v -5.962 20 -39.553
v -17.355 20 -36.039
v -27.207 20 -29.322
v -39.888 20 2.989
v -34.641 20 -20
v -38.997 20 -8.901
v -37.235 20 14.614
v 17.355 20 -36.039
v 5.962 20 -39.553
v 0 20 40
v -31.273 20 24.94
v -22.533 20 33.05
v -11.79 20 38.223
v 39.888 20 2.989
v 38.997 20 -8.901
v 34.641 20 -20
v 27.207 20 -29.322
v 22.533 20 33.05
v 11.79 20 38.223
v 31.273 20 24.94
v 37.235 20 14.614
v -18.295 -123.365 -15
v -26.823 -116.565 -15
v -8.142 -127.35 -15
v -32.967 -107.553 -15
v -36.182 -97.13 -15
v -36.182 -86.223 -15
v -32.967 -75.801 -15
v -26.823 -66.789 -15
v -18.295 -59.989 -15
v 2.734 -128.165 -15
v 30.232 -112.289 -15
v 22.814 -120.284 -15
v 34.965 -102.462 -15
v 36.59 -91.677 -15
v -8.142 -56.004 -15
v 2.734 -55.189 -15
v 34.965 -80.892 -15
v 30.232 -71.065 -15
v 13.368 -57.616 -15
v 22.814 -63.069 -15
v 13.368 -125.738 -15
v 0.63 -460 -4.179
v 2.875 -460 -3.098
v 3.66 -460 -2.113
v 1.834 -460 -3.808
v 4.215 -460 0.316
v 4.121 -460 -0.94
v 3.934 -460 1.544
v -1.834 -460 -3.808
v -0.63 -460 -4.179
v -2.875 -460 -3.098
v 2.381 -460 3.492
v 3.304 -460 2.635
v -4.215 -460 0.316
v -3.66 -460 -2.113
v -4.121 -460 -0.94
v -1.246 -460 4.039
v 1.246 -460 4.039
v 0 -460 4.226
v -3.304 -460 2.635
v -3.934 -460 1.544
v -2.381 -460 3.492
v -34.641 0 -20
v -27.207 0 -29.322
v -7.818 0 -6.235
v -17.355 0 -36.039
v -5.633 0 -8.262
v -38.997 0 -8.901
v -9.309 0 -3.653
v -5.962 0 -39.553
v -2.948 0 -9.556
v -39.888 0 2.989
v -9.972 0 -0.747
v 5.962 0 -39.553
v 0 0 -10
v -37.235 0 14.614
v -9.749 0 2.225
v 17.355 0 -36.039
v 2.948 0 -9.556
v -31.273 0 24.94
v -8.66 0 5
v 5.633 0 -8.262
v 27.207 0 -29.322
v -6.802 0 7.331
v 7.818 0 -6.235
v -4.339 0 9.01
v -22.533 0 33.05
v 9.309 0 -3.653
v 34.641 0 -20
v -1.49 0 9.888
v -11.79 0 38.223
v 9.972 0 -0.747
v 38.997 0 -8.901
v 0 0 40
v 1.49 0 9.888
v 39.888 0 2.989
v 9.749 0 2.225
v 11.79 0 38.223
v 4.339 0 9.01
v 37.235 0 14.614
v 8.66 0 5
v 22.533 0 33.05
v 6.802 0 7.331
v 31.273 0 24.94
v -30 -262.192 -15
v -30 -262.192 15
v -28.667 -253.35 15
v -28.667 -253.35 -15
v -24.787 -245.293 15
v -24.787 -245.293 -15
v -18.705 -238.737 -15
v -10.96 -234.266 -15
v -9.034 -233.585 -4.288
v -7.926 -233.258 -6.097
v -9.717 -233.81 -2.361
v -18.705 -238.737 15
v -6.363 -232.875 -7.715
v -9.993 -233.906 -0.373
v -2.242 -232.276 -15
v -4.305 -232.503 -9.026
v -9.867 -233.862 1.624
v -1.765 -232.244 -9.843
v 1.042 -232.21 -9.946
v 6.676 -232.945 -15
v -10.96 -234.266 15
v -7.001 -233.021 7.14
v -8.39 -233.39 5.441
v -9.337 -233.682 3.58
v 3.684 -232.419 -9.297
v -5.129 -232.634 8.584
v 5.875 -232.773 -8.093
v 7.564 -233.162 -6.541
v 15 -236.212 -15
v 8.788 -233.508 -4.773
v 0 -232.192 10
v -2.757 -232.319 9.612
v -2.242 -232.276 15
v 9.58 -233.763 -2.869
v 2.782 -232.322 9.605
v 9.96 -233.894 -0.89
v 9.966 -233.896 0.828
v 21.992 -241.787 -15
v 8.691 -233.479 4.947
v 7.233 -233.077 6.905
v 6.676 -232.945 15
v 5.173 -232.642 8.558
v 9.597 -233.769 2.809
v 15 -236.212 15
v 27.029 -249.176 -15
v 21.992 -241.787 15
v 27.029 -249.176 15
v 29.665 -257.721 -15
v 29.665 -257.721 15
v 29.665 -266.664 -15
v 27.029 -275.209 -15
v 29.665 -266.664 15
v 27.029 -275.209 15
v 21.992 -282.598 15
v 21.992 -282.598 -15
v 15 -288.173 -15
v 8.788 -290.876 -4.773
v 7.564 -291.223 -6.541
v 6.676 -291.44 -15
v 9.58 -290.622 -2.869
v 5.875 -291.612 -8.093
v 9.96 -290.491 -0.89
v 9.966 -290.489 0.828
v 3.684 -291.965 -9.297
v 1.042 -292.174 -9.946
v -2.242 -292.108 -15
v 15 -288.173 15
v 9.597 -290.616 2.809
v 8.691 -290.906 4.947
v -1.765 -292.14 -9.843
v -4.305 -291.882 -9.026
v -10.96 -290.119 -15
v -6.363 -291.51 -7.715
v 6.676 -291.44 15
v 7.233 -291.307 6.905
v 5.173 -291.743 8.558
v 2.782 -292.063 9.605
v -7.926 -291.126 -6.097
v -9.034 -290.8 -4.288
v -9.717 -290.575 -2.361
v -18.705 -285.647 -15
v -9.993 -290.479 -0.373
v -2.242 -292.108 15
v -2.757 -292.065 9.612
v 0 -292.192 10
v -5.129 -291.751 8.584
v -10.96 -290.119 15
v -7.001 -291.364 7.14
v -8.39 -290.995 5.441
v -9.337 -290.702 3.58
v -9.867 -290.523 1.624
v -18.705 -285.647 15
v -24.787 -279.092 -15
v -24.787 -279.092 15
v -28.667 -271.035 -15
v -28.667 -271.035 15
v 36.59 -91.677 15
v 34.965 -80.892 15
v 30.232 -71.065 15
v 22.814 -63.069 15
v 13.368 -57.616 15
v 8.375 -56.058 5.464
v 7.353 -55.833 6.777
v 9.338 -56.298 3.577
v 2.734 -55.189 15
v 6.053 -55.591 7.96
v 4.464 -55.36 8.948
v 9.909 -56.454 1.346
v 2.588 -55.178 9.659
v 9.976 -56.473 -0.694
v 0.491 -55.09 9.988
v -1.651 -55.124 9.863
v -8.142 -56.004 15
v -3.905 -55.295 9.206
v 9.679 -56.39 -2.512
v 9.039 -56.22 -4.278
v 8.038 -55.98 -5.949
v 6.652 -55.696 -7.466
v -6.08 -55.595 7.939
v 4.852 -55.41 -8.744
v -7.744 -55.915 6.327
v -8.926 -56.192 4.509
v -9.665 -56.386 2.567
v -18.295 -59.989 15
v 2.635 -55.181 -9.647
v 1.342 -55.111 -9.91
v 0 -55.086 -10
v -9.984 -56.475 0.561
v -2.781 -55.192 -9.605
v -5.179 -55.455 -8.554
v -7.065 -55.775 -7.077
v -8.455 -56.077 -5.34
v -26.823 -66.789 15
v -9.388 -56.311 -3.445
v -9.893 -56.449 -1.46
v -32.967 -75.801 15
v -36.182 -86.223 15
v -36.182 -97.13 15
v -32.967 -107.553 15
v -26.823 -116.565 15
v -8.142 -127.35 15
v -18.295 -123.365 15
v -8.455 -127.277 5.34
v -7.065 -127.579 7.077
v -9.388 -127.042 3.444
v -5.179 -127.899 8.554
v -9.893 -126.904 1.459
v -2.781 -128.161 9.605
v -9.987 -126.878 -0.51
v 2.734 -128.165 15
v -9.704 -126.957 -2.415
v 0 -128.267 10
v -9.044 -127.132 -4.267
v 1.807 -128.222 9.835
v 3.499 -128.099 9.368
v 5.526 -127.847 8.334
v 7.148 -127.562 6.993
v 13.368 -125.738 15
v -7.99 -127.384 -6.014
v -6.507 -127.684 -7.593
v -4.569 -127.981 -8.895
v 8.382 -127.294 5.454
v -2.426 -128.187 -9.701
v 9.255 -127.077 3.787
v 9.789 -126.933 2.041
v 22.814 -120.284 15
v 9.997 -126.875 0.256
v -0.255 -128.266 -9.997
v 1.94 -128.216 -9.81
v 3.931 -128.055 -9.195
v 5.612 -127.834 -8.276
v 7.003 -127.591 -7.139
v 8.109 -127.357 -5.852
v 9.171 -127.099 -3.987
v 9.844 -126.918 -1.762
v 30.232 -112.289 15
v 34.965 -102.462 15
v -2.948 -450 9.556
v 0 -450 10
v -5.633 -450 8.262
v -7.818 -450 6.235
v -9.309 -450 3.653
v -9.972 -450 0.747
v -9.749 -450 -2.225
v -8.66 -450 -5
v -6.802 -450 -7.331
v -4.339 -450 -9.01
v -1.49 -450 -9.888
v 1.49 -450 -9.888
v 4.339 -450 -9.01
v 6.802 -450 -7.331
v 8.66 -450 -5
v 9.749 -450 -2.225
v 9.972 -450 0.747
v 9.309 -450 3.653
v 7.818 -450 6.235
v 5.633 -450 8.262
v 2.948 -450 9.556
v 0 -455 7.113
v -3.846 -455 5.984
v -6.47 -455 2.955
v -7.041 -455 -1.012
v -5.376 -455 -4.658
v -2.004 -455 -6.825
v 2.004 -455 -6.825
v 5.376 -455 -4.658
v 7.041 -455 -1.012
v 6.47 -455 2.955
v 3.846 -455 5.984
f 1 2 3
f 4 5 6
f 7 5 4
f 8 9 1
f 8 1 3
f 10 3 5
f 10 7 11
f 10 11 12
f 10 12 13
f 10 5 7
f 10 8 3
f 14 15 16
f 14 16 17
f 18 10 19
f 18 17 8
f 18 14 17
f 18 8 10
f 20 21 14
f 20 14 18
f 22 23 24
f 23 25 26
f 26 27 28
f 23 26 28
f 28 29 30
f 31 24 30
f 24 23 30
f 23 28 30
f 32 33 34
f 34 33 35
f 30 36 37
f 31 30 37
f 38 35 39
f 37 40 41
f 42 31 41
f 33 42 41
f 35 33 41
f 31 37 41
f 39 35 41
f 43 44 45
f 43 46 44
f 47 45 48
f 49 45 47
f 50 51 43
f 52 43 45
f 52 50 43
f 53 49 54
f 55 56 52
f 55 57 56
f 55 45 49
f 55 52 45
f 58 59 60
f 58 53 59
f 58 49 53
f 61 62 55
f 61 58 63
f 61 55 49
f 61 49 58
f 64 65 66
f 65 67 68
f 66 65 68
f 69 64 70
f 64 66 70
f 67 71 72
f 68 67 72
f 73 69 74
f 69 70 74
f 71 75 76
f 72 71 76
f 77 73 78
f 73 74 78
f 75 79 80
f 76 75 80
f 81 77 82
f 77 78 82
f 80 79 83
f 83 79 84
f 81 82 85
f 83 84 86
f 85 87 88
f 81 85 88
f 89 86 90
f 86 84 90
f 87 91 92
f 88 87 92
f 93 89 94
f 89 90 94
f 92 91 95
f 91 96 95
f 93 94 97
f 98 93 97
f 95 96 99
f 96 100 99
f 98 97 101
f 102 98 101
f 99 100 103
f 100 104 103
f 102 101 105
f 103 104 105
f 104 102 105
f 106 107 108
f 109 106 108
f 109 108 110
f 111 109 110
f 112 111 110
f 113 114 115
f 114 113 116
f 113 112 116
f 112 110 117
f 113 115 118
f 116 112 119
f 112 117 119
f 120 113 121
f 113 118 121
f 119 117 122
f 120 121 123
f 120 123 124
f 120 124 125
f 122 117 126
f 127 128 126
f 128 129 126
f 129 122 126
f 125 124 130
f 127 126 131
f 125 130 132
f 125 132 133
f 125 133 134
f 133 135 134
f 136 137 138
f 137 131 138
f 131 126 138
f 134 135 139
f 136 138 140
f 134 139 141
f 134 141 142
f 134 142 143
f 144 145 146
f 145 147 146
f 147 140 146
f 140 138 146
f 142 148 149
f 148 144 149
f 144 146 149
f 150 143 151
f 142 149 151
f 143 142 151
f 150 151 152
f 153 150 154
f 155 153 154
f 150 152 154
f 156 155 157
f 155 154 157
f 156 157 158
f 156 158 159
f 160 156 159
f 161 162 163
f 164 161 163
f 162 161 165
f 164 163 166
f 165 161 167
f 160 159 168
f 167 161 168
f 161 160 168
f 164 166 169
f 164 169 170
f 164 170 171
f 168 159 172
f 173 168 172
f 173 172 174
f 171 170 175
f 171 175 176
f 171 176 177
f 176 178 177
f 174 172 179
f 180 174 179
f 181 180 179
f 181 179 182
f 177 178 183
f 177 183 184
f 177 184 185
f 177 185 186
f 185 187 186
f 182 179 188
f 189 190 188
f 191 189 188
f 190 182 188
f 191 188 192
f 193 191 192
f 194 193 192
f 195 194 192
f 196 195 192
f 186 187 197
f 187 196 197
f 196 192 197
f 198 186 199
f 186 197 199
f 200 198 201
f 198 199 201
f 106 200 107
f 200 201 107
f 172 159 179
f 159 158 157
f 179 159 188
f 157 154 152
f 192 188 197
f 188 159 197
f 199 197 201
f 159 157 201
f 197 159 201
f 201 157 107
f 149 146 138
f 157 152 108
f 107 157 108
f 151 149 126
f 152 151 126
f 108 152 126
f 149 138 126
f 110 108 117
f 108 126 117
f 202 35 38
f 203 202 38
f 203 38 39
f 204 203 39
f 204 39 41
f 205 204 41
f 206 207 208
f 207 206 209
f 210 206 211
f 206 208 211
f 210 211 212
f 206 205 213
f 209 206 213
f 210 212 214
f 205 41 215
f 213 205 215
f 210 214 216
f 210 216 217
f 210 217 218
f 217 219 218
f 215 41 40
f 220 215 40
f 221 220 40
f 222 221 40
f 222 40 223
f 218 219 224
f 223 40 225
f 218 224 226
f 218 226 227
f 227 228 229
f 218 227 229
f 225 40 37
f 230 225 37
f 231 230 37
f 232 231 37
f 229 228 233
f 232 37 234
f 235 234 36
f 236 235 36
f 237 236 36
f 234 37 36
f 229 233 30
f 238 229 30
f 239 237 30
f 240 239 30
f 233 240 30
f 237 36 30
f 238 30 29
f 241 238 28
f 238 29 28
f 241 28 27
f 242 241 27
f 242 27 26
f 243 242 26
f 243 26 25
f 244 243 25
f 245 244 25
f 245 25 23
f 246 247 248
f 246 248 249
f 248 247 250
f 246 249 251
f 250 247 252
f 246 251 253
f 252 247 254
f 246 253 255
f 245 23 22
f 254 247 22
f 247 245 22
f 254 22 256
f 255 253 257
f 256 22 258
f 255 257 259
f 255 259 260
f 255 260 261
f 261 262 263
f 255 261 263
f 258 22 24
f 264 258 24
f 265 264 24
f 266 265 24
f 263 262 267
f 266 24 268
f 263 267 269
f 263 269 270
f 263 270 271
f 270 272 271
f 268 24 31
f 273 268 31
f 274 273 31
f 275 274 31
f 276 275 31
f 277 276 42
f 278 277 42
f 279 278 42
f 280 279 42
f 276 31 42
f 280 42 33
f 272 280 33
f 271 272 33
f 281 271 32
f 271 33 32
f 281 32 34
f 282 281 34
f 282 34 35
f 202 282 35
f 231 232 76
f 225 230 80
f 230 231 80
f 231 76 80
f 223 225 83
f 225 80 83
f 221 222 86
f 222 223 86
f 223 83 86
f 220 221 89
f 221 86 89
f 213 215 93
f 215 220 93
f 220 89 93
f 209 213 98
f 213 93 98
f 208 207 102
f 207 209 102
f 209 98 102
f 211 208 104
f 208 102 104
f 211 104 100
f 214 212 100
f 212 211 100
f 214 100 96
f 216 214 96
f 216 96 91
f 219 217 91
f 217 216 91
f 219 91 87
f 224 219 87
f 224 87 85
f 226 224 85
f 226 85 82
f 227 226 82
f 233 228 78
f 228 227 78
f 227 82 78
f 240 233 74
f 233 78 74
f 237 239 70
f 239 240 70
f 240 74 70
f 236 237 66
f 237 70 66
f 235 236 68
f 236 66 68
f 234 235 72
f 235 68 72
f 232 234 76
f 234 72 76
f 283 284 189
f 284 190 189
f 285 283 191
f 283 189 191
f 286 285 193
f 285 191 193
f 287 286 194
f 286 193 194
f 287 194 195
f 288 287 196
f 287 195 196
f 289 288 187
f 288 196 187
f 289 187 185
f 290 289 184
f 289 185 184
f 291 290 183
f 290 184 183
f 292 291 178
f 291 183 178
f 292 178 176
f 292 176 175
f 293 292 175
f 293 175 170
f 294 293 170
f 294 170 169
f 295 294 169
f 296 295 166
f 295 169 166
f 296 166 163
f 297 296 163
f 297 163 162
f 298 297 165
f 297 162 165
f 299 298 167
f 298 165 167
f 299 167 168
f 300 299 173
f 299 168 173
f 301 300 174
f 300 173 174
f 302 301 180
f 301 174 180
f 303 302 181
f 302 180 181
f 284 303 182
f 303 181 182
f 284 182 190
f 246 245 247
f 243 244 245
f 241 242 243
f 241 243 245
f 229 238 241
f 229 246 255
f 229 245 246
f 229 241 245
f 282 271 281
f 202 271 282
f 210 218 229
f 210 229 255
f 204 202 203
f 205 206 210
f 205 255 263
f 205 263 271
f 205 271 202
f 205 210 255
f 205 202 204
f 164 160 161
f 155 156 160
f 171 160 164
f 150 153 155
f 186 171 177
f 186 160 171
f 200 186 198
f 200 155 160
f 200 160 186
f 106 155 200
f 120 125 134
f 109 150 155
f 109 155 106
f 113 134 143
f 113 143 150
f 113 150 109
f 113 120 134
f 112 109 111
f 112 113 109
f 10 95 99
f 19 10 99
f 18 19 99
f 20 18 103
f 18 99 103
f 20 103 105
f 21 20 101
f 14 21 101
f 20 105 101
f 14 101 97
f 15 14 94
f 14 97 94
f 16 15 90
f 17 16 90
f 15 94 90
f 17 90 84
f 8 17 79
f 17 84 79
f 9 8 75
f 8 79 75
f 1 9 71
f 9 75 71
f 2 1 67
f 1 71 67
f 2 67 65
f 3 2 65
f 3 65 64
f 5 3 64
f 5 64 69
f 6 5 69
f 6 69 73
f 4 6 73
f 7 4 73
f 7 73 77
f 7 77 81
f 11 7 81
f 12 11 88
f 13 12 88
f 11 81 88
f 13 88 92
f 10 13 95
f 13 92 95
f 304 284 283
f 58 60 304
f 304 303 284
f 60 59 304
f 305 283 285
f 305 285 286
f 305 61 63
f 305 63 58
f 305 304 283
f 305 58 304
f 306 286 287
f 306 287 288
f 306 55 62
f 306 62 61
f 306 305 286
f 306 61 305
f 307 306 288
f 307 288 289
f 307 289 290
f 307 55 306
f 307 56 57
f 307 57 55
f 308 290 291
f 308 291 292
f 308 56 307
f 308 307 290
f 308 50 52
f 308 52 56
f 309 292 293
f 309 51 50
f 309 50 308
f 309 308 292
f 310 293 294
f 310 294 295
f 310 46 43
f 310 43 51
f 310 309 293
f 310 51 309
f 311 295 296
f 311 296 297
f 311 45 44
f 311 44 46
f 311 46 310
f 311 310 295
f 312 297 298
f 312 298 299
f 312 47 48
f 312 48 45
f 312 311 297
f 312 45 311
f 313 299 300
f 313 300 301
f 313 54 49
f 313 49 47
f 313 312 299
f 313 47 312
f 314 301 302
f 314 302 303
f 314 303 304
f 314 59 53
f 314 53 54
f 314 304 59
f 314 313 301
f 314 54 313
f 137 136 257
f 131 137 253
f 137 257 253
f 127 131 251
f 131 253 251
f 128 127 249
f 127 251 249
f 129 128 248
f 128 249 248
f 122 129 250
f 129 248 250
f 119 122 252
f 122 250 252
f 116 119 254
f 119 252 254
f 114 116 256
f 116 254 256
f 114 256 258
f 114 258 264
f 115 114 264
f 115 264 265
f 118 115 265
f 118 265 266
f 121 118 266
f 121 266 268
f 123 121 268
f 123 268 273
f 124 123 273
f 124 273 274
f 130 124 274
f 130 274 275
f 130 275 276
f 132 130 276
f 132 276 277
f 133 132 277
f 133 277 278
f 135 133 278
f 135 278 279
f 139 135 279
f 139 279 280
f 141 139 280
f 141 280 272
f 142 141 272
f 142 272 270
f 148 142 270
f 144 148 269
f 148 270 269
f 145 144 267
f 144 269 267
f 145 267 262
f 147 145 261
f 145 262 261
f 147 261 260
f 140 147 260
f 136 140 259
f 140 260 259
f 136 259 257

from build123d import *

# Parameters (mm, degrees)
SKETCH_1_R                = 40
EXTRUDE_1_DEPTH           = 20
SKETCH_2_R                = 10
EXTRUDE_2_DEPTH           = 60
EXTRUDE_3_DEPTH           = 15
EXTRUDE_3_DEPTH_BACK      = 15
SKETCH_3_R                = 36.590327892
SKETCH_2_2_R              = 10
EXTRUDE_4_DEPTH           = 450
EXTRUDE_5_DEPTH           = 0.0001
EXTRUDE_5_DEPTH_BACK      = 30
SKETCH_7_R                = 30
SKETCH_8_R                = 10
EXTRUDE_6_DEPTH           = 10
EXTRUDE_6_TAPER           = 30
EXTRUDE_6_OTHER_WAY_DEPTH = 0.0001


with BuildPart() as part:
    # 草图1 → 凸台-拉伸1 (new body)
    with BuildSketch(Plane(origin=(0, 0, 0), x_dir=(1, 0, 0), z_dir=(0, 1, 0))):
        Circle(SKETCH_1_R)
    extrude(amount=EXTRUDE_1_DEPTH)

    # 草图2 → 凸台-拉伸2 (add)
    with BuildSketch(Plane(origin=(0, 0, 0), x_dir=(-1, 0, 0), z_dir=(0, -1, 0))):
        Circle(SKETCH_2_R)
    extrude(amount=EXTRUDE_2_DEPTH)

    # 草图3 → 凸台-拉伸3 (add, two sides: drawn at the far end of the back side and taken through both)
    with BuildSketch(Plane.XY.offset(-EXTRUDE_3_DEPTH_BACK)):
        with Locations((0, -91.676757002)):
            Circle(SKETCH_3_R)
    extrude(amount=EXTRUDE_3_DEPTH + EXTRUDE_3_DEPTH_BACK)

    # 草图2<2> → 凸台-拉伸4 (add)
    with BuildSketch(Plane(origin=(0, 0, 0), x_dir=(-1, 0, 0), z_dir=(0, -1, 0))):
        Circle(SKETCH_2_2_R)
    extrude(amount=EXTRUDE_4_DEPTH)

    # 草图7 → 凸台-拉伸5 (add, two sides: drawn at the far end of the back side and taken through both)
    with BuildSketch(Plane(origin=(0, 0, -15), x_dir=(-1, 0, 0), z_dir=(0, 0, -1)).offset(-EXTRUDE_5_DEPTH_BACK)):
        with Locations((0, -262.19236229)):
            Circle(SKETCH_7_R)
    extrude(amount=EXTRUDE_5_DEPTH + EXTRUDE_5_DEPTH_BACK)

    # 草图8 → 凸台-拉伸6 (add)
    with BuildSketch(Plane.XZ.offset(450)):
        Circle(SKETCH_8_R)
    extrude(amount=EXTRUDE_6_DEPTH, taper=EXTRUDE_6_TAPER)

    # 草图8 → 凸台-拉伸6 other way (add)
    with BuildSketch(Plane.XZ.offset(450)):
        Circle(SKETCH_8_R)
    extrude(amount=-EXTRUDE_6_OTHER_WAY_DEPTH)


solid = part.part
